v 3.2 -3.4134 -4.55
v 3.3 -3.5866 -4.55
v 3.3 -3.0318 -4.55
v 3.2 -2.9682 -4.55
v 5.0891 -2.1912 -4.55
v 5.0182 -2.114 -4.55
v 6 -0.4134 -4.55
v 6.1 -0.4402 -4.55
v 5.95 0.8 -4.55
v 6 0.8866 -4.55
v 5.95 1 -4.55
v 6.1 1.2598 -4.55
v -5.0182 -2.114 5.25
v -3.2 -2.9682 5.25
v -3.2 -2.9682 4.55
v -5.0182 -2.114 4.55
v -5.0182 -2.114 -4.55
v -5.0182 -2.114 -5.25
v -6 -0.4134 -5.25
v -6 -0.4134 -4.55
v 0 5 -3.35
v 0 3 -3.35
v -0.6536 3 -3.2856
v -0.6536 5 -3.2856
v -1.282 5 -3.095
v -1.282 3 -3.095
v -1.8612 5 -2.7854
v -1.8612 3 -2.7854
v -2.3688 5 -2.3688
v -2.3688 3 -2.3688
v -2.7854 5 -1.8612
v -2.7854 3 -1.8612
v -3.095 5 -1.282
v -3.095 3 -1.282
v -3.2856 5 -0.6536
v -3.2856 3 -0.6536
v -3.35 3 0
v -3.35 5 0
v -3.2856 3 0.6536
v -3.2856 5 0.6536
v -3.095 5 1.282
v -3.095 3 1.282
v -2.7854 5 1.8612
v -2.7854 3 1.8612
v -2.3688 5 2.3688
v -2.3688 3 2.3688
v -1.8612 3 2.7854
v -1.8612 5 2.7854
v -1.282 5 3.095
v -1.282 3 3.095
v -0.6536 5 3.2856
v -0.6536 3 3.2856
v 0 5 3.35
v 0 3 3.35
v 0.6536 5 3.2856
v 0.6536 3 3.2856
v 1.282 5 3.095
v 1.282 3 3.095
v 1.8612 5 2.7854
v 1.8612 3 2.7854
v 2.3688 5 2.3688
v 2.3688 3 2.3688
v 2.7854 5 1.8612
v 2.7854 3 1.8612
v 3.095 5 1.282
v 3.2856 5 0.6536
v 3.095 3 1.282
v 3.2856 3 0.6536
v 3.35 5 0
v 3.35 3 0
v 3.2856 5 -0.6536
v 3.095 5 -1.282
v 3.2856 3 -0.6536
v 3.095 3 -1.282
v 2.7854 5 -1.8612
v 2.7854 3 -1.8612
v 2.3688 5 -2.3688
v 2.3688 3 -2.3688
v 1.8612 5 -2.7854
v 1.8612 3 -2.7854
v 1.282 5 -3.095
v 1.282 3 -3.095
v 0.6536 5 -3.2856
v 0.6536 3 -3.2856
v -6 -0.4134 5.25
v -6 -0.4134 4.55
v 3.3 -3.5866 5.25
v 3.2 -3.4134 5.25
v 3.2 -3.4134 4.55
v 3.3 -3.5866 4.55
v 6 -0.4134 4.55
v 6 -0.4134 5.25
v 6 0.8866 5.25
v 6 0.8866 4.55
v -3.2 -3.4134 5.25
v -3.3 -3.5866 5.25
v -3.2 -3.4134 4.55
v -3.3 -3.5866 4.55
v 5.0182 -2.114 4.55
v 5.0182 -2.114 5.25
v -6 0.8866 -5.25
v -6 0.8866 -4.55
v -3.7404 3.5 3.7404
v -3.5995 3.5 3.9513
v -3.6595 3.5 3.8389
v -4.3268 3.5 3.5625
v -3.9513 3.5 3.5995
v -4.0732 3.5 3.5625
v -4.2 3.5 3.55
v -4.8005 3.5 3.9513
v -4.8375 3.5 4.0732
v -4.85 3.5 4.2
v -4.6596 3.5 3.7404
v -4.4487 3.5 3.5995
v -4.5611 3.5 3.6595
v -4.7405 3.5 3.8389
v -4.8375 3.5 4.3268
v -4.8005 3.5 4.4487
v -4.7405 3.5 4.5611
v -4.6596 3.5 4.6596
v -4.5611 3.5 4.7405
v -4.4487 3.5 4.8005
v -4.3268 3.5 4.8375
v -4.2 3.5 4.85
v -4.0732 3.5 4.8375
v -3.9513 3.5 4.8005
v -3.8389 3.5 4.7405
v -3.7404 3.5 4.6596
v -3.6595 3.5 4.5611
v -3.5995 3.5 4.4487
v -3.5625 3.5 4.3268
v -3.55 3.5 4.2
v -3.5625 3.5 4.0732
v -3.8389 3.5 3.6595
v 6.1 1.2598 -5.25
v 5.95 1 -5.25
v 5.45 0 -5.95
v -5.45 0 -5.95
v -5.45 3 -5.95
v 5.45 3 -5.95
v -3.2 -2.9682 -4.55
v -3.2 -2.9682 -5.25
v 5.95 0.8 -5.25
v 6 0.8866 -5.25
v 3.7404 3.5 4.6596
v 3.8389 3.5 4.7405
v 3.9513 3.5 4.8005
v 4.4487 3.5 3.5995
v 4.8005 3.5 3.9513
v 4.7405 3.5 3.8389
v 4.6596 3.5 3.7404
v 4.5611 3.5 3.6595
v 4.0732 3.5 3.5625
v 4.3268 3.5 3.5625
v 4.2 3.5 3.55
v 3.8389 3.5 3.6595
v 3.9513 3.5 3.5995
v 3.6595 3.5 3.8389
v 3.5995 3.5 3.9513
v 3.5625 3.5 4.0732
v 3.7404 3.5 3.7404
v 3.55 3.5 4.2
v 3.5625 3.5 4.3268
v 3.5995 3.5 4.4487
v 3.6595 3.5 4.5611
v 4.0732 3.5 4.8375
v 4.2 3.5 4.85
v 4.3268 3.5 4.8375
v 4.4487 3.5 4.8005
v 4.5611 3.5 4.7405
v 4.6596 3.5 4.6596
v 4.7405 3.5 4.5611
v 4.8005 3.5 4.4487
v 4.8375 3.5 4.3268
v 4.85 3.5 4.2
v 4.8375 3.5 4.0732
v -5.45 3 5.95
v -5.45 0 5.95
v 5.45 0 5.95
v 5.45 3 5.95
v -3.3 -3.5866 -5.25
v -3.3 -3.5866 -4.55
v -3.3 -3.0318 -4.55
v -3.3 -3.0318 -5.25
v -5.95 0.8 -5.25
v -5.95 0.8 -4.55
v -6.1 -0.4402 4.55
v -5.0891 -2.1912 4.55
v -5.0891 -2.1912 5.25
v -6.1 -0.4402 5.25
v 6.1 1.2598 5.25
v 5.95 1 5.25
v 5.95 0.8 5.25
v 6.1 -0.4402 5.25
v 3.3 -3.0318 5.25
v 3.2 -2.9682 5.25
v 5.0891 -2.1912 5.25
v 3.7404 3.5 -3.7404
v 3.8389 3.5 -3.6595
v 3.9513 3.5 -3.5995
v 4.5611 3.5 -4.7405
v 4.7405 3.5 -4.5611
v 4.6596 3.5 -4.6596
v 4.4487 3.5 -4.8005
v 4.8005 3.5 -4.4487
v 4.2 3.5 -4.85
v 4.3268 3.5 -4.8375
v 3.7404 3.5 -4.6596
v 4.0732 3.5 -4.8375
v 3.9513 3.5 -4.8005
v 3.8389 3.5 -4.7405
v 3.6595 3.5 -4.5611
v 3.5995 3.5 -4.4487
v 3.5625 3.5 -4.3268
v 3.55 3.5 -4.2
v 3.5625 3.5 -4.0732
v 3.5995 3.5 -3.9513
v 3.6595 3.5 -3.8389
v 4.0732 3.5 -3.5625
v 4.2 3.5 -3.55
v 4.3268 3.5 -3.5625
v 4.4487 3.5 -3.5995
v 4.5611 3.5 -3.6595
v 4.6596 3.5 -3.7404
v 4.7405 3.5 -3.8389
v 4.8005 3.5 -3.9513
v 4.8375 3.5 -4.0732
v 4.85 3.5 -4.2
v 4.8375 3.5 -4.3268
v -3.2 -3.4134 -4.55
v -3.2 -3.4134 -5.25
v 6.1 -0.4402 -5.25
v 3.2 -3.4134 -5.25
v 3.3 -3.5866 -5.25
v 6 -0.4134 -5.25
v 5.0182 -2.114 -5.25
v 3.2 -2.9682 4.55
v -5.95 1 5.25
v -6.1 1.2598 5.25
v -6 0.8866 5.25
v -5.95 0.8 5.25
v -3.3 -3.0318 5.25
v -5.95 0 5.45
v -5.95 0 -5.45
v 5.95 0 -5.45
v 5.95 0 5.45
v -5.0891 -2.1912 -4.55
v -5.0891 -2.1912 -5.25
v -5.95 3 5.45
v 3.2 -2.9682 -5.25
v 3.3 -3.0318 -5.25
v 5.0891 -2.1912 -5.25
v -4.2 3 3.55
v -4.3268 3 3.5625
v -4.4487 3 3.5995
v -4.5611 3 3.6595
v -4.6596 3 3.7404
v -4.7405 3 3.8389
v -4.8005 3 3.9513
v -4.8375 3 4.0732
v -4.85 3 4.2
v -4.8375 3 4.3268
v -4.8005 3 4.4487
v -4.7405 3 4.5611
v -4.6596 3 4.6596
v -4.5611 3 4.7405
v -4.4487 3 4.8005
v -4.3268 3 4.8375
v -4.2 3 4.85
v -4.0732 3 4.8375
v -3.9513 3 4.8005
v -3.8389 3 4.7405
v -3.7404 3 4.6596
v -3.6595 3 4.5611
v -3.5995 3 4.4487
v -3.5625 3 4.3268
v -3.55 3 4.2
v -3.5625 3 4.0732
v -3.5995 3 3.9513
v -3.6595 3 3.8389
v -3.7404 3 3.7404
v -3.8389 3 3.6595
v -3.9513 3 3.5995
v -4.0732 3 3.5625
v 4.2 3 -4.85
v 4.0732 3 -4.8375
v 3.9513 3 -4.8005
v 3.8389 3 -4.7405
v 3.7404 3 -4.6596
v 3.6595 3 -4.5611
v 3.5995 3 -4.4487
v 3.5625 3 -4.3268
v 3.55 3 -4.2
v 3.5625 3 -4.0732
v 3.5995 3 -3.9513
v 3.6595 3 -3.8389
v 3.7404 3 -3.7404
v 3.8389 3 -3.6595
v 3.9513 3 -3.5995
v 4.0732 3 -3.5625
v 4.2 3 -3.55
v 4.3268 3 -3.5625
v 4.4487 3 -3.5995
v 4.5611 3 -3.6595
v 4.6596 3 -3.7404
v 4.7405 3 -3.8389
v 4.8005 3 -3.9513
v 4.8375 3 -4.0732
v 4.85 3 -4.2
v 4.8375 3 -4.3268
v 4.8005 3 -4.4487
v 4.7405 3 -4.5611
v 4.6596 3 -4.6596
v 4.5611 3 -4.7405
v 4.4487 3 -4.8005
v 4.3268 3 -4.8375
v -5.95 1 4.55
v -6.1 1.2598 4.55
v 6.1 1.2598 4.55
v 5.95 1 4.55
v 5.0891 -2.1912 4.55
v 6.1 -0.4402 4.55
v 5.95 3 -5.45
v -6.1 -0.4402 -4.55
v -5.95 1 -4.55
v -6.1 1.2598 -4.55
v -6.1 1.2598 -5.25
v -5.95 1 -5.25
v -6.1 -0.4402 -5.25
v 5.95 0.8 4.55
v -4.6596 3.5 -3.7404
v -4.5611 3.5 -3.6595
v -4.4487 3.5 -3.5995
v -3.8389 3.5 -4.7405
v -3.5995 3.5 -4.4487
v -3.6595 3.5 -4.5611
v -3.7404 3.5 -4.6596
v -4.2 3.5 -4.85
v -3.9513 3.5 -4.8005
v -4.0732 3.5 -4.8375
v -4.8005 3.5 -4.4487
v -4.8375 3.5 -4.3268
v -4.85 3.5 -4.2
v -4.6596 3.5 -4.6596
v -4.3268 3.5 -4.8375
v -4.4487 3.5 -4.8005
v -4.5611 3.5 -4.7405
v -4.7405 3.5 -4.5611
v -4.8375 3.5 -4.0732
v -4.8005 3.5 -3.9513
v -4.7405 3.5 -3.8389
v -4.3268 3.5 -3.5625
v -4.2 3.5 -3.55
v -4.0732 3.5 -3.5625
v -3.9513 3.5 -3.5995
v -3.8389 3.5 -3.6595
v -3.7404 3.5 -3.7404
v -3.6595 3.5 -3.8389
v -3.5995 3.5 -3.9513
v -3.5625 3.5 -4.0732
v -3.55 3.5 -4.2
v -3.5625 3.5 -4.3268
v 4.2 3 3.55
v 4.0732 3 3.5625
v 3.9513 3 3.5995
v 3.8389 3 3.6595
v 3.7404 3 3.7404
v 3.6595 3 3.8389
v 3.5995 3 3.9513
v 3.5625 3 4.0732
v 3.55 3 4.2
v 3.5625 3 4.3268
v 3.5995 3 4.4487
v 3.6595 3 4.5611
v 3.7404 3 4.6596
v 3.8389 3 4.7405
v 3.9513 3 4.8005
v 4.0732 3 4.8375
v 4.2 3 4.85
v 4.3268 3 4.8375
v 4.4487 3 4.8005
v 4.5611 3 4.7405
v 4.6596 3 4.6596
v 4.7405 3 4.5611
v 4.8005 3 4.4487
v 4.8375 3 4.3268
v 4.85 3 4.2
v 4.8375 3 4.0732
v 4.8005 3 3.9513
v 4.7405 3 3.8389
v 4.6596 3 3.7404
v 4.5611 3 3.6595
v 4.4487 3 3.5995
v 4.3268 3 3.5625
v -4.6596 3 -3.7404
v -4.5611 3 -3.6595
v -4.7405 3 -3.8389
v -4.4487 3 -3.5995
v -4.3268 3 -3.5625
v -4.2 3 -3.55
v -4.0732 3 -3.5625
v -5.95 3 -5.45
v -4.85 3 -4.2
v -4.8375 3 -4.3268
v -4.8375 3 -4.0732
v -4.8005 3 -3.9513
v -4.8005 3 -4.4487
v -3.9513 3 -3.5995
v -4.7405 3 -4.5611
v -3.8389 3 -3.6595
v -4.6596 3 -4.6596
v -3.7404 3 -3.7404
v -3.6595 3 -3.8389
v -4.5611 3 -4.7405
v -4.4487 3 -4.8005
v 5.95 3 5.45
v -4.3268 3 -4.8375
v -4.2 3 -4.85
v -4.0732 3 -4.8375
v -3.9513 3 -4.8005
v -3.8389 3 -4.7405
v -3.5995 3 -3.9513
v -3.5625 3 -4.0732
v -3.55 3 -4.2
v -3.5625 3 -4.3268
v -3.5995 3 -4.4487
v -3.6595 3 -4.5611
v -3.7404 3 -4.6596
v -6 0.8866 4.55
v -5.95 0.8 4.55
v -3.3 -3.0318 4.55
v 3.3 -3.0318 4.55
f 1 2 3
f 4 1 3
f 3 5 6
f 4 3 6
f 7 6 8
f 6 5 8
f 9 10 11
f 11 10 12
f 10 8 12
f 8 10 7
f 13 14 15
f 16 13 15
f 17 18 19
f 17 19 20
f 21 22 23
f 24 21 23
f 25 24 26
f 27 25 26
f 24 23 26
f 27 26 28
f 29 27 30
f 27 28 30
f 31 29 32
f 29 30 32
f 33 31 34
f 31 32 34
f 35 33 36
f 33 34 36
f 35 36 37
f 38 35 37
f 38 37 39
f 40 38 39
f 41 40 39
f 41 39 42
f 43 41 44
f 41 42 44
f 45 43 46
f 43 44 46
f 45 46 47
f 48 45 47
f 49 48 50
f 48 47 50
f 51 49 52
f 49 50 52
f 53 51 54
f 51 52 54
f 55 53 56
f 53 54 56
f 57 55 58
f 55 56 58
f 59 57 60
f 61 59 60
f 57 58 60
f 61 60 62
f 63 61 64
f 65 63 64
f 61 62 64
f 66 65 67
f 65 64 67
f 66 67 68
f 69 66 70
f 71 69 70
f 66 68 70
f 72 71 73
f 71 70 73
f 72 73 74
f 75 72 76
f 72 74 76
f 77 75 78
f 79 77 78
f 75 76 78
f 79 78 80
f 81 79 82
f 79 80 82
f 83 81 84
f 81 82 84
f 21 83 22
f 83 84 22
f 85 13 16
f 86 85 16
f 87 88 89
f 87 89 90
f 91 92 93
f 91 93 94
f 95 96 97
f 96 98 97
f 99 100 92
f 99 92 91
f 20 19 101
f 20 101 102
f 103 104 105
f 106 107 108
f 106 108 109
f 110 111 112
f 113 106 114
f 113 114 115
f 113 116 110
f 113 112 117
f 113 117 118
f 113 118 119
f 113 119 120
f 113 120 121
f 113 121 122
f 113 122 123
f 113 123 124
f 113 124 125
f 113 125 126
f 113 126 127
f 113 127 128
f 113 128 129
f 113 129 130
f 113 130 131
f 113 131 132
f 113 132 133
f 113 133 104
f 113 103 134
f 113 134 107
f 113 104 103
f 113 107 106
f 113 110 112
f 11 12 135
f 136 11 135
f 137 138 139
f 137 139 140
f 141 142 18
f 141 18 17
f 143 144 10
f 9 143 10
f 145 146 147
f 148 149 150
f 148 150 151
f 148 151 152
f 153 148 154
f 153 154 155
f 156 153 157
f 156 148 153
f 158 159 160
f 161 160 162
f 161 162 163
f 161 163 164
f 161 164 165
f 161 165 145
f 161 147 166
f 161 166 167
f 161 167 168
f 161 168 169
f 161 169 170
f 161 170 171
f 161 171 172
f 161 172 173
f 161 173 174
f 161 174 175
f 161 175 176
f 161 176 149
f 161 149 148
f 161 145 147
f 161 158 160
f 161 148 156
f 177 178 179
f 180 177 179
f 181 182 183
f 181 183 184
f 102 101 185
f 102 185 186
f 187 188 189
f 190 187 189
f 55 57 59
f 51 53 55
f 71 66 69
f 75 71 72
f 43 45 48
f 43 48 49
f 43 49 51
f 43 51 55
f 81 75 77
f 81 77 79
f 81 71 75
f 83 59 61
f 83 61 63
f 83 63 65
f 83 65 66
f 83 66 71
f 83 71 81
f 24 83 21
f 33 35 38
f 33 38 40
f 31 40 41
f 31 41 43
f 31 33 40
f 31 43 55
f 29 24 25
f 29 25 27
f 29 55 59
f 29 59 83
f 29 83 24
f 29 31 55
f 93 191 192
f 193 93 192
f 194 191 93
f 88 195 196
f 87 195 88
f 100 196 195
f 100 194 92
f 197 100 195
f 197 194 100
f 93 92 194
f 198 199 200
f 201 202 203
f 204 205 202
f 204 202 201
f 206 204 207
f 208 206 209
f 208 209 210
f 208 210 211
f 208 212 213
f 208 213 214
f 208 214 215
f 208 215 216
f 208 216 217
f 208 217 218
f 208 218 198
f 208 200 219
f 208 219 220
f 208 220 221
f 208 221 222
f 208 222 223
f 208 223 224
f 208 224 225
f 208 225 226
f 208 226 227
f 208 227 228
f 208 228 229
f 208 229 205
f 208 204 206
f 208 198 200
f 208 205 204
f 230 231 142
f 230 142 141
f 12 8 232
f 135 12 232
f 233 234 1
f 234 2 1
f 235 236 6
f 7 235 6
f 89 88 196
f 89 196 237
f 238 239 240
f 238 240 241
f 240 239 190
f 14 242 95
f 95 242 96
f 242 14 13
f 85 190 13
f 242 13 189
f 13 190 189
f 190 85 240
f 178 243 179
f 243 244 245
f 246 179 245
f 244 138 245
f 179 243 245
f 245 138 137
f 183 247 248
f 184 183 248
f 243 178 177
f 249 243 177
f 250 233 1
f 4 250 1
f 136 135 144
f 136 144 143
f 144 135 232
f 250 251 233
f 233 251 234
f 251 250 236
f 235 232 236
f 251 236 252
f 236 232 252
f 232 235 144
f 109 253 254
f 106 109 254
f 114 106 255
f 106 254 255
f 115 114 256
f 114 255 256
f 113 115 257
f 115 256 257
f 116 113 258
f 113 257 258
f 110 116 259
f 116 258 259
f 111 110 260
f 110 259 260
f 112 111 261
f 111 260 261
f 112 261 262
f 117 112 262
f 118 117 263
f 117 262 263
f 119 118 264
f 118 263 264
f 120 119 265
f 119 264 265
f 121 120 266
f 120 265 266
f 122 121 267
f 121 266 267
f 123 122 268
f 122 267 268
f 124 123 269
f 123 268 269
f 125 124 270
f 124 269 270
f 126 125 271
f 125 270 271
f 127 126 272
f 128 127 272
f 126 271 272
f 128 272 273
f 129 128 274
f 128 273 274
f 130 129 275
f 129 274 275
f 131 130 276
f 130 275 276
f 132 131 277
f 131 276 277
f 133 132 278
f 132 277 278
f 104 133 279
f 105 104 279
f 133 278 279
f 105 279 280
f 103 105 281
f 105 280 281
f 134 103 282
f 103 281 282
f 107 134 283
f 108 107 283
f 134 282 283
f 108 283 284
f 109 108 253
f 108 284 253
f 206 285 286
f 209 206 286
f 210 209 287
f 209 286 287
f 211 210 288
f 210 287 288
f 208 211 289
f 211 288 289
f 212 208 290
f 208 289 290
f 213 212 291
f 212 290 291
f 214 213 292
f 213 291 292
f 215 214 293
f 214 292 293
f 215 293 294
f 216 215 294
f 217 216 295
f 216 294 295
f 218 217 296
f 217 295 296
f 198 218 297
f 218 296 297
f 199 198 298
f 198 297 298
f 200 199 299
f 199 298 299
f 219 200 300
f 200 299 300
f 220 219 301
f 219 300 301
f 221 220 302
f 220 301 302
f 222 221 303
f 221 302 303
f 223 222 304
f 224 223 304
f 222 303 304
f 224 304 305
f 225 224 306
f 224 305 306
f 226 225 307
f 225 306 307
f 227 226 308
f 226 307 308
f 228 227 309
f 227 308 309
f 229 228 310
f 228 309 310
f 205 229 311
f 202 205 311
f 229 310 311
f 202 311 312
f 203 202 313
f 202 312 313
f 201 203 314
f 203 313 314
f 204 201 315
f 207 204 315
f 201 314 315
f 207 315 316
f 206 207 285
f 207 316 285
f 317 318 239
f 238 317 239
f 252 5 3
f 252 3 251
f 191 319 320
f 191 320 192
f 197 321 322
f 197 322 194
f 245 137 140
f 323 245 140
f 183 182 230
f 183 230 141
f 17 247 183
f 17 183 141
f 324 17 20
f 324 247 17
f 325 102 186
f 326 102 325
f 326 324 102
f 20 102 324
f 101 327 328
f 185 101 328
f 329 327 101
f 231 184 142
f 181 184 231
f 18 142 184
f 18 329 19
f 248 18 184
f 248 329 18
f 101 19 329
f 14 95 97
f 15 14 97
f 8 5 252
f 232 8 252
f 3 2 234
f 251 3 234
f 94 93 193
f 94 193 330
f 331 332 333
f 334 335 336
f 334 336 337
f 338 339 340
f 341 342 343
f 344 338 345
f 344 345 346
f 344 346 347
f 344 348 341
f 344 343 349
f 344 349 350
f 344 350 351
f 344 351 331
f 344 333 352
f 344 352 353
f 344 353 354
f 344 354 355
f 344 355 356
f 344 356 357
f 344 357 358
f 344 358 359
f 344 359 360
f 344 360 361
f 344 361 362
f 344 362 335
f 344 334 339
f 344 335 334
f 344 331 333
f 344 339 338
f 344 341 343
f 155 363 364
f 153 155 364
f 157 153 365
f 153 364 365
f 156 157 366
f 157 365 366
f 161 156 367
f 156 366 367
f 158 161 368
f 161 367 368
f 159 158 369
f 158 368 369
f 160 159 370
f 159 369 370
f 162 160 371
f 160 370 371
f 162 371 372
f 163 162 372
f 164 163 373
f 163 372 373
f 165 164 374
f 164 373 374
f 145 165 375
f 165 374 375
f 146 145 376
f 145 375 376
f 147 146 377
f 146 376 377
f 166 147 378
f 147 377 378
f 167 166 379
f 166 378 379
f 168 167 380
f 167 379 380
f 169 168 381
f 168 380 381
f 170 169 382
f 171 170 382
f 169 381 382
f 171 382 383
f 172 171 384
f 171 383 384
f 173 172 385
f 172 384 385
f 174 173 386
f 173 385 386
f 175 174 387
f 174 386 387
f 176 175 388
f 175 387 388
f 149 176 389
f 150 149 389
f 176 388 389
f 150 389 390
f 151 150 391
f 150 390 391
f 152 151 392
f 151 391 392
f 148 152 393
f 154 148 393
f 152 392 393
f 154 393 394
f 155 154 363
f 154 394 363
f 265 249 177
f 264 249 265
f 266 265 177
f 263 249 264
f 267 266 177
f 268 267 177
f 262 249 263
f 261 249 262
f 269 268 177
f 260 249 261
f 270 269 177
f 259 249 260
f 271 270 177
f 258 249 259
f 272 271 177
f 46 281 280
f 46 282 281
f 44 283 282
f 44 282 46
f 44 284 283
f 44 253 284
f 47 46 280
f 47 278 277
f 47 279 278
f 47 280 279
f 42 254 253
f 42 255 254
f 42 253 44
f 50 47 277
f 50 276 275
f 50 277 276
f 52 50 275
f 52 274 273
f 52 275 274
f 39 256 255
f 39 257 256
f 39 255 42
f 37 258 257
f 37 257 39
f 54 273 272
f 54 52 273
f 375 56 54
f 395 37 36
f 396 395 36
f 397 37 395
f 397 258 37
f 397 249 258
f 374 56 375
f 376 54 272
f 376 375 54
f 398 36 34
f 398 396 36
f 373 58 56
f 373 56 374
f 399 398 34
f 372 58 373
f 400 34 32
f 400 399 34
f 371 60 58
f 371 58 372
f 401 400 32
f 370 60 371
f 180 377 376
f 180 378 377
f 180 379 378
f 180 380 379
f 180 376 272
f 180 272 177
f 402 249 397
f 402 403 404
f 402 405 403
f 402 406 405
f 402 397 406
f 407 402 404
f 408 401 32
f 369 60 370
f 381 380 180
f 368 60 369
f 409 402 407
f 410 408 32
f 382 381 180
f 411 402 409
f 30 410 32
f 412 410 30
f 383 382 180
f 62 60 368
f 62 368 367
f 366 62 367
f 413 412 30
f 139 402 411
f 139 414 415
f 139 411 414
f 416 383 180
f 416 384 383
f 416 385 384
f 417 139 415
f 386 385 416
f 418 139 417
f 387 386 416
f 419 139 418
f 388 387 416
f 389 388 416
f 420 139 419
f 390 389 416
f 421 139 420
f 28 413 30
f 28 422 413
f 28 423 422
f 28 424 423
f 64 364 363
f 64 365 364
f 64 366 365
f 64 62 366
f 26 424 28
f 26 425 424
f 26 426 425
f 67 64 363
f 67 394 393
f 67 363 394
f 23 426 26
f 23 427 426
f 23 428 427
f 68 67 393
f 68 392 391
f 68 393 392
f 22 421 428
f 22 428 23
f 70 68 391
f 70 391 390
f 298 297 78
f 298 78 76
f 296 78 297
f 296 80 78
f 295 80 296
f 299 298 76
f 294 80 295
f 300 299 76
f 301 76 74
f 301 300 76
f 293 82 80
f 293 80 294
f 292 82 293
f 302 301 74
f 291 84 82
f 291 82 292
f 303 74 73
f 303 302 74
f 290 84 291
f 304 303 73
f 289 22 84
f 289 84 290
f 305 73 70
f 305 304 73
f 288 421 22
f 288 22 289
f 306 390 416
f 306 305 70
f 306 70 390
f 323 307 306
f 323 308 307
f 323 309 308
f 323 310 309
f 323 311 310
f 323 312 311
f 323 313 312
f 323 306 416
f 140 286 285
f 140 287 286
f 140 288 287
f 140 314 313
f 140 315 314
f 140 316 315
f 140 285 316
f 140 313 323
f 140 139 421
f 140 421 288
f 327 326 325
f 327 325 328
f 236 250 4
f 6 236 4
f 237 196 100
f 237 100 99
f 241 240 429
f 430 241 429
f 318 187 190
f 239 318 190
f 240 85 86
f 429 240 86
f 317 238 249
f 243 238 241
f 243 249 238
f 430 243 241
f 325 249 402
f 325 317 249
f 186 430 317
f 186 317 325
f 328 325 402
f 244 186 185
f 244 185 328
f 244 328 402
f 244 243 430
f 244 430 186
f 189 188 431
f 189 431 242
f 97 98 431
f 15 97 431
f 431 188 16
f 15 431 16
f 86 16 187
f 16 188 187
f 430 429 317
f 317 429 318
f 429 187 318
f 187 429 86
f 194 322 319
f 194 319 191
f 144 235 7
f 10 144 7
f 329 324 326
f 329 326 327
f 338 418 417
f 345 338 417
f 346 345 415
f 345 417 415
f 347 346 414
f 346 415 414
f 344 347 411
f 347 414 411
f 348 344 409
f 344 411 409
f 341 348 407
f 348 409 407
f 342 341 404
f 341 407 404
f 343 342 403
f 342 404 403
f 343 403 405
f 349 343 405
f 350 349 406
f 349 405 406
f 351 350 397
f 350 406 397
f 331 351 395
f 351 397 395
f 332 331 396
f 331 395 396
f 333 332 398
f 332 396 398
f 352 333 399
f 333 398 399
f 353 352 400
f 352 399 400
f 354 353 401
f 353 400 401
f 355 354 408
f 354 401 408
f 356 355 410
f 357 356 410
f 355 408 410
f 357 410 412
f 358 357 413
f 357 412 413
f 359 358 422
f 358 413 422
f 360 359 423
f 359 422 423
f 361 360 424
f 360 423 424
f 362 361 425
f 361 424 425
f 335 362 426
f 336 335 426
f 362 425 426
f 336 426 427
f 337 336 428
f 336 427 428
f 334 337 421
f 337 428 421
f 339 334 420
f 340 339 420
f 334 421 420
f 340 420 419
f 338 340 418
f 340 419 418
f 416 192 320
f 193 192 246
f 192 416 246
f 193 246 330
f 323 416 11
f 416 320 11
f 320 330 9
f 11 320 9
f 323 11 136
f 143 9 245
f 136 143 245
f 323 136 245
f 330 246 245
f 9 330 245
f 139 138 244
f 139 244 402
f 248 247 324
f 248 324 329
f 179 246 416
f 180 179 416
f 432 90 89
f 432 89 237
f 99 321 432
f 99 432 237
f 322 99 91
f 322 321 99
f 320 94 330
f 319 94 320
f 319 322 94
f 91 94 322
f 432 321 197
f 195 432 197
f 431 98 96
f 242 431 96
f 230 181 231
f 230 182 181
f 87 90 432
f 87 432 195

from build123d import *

# Parameters (mm, degrees)
SKETCH1_W               = 11.9
SKETCH1_H               = 11.9
BOSS_EXTRUDE1_DEPTH     = 3
CHAMFER1_SIZE           = 0.5
SKETCH3_R               = 3.35
BOSS_EXTRUDE2_DEPTH     = 2
SKETCH4_R               = 0.65
BOSS_EXTRUDE6_DEPTH     = 0.5
SKETCH6_W               = 0.7
SKETCH6_H               = 0.2
MIRROR2_COPY_1_SKETCH_W = 0.7
MIRROR2_COPY_1_SKETCH_H = 0.2


with BuildPart() as part:
    # Sketch1 → Boss-Extrude1 (new body)
    with BuildSketch(Plane(origin=(0, 0, 0), x_dir=(1, 0, 0), z_dir=(0, 1, 0))):
        Rectangle(SKETCH1_W, SKETCH1_H)
    extrude(amount=BOSS_EXTRUDE1_DEPTH)

    # Chamfer1
    chamfer1_edges = [part.edges().sort_by_distance(p)[0] for p in [
        (5.95, 1.5, 5.95),
        (-5.95, 1.5, 5.95),
        (-5.95, 1.5, -5.95),
        (5.95, 1.5, -5.95),
    ]]
    chamfer(chamfer1_edges, length=CHAMFER1_SIZE)

    # Sketch3 → Boss-Extrude2 (add)
    with BuildSketch(Plane(origin=(0, 3, 0), x_dir=(1, 0, 0), z_dir=(0, 1, 0))):
        with Locations(Location((0, 0, 0), (0, 0, 90))):
            Circle(SKETCH3_R)
    extrude(amount=BOSS_EXTRUDE2_DEPTH)

    # Sketch4 → Boss-Extrude6 (add)
    with BuildSketch(Plane(origin=(0, 3, 0), x_dir=(1, 0, 0), z_dir=(0, 1, 0))):
        with Locations(Location((4.2, 4.2, 0), (0, 0, 90))):
            Circle(SKETCH4_R)
        with Locations(Location((4.2, -4.2, 0), (0, 0, 90))):
            Circle(SKETCH4_R)
        with Locations(Location((-4.2, 4.2, 0), (0, 0, 90))):
            Circle(SKETCH4_R)
        with Locations(Location((-4.2, -4.2, 0), (0, 0, 90))):
            Circle(SKETCH4_R)
    extrude(amount=BOSS_EXTRUDE6_DEPTH)

    # Sweep1: sweep along a path in Sketch7
    with BuildLine(Plane.XY) as sweep1_path:
        Line((-5.95, 0.9), (-6.05, 1.073205081))
        Line((-6.05, 1.073205081), (-6.05, -0.426794919))
        Line((-6.05, -0.426794919), (-5.053614445, -2.152585325))
        Line((-5.053614445, -2.152585325), (-3.25, -3))
        Line((-3.25, -3), (-3.25, -3.5))
    # Sketch6 → Sweep1 (sweep)
    with BuildSketch(Plane.ZY.offset(5.95)):
        with Locations((-4.9, 0.9)):
            Rectangle(SKETCH6_W, SKETCH6_H)
    sweep1 = sweep(path=sweep1_path.line, transition=Transition.RIGHT)

    # Mirror1: Sweep1 across plane
    add(sweep1.mirror(Plane.XY))

    # Mirror2: Sweep1 across plane
    add(sweep1.mirror(Plane(origin=(0, 0, 0), x_dir=(0, 0, 1), z_dir=(1, 0, 0))))

    # Mirror2 copy 1: sweep along a path in Mirror2 copy 1 path
    with BuildLine(Plane(origin=(0, 0, 0), x_dir=(-1, 0, 0), z_dir=(0, 0, -1))) as mirror2_copy_1_path:
        Line((-5.95, 0.9), (-6.05, 1.073205081))
        Line((-6.05, 1.073205081), (-6.05, -0.426794919))
        Line((-6.05, -0.426794919), (-5.053614445, -2.152585325))
        Line((-5.053614445, -2.152585325), (-3.25, -3))
        Line((-3.25, -3), (-3.25, -3.5))
    # Mirror2 copy 1 sketch → Mirror2 copy 1 (sweep)
    with BuildSketch(Plane(origin=(5.95, 0, 0), x_dir=(0, 0, -1), z_dir=(1, 0, 0))):
        with Locations((-4.9, 0.9)):
            Rectangle(MIRROR2_COPY_1_SKETCH_W, MIRROR2_COPY_1_SKETCH_H)
    sweep(path=mirror2_copy_1_path.line, transition=Transition.RIGHT)


solid = part.part
